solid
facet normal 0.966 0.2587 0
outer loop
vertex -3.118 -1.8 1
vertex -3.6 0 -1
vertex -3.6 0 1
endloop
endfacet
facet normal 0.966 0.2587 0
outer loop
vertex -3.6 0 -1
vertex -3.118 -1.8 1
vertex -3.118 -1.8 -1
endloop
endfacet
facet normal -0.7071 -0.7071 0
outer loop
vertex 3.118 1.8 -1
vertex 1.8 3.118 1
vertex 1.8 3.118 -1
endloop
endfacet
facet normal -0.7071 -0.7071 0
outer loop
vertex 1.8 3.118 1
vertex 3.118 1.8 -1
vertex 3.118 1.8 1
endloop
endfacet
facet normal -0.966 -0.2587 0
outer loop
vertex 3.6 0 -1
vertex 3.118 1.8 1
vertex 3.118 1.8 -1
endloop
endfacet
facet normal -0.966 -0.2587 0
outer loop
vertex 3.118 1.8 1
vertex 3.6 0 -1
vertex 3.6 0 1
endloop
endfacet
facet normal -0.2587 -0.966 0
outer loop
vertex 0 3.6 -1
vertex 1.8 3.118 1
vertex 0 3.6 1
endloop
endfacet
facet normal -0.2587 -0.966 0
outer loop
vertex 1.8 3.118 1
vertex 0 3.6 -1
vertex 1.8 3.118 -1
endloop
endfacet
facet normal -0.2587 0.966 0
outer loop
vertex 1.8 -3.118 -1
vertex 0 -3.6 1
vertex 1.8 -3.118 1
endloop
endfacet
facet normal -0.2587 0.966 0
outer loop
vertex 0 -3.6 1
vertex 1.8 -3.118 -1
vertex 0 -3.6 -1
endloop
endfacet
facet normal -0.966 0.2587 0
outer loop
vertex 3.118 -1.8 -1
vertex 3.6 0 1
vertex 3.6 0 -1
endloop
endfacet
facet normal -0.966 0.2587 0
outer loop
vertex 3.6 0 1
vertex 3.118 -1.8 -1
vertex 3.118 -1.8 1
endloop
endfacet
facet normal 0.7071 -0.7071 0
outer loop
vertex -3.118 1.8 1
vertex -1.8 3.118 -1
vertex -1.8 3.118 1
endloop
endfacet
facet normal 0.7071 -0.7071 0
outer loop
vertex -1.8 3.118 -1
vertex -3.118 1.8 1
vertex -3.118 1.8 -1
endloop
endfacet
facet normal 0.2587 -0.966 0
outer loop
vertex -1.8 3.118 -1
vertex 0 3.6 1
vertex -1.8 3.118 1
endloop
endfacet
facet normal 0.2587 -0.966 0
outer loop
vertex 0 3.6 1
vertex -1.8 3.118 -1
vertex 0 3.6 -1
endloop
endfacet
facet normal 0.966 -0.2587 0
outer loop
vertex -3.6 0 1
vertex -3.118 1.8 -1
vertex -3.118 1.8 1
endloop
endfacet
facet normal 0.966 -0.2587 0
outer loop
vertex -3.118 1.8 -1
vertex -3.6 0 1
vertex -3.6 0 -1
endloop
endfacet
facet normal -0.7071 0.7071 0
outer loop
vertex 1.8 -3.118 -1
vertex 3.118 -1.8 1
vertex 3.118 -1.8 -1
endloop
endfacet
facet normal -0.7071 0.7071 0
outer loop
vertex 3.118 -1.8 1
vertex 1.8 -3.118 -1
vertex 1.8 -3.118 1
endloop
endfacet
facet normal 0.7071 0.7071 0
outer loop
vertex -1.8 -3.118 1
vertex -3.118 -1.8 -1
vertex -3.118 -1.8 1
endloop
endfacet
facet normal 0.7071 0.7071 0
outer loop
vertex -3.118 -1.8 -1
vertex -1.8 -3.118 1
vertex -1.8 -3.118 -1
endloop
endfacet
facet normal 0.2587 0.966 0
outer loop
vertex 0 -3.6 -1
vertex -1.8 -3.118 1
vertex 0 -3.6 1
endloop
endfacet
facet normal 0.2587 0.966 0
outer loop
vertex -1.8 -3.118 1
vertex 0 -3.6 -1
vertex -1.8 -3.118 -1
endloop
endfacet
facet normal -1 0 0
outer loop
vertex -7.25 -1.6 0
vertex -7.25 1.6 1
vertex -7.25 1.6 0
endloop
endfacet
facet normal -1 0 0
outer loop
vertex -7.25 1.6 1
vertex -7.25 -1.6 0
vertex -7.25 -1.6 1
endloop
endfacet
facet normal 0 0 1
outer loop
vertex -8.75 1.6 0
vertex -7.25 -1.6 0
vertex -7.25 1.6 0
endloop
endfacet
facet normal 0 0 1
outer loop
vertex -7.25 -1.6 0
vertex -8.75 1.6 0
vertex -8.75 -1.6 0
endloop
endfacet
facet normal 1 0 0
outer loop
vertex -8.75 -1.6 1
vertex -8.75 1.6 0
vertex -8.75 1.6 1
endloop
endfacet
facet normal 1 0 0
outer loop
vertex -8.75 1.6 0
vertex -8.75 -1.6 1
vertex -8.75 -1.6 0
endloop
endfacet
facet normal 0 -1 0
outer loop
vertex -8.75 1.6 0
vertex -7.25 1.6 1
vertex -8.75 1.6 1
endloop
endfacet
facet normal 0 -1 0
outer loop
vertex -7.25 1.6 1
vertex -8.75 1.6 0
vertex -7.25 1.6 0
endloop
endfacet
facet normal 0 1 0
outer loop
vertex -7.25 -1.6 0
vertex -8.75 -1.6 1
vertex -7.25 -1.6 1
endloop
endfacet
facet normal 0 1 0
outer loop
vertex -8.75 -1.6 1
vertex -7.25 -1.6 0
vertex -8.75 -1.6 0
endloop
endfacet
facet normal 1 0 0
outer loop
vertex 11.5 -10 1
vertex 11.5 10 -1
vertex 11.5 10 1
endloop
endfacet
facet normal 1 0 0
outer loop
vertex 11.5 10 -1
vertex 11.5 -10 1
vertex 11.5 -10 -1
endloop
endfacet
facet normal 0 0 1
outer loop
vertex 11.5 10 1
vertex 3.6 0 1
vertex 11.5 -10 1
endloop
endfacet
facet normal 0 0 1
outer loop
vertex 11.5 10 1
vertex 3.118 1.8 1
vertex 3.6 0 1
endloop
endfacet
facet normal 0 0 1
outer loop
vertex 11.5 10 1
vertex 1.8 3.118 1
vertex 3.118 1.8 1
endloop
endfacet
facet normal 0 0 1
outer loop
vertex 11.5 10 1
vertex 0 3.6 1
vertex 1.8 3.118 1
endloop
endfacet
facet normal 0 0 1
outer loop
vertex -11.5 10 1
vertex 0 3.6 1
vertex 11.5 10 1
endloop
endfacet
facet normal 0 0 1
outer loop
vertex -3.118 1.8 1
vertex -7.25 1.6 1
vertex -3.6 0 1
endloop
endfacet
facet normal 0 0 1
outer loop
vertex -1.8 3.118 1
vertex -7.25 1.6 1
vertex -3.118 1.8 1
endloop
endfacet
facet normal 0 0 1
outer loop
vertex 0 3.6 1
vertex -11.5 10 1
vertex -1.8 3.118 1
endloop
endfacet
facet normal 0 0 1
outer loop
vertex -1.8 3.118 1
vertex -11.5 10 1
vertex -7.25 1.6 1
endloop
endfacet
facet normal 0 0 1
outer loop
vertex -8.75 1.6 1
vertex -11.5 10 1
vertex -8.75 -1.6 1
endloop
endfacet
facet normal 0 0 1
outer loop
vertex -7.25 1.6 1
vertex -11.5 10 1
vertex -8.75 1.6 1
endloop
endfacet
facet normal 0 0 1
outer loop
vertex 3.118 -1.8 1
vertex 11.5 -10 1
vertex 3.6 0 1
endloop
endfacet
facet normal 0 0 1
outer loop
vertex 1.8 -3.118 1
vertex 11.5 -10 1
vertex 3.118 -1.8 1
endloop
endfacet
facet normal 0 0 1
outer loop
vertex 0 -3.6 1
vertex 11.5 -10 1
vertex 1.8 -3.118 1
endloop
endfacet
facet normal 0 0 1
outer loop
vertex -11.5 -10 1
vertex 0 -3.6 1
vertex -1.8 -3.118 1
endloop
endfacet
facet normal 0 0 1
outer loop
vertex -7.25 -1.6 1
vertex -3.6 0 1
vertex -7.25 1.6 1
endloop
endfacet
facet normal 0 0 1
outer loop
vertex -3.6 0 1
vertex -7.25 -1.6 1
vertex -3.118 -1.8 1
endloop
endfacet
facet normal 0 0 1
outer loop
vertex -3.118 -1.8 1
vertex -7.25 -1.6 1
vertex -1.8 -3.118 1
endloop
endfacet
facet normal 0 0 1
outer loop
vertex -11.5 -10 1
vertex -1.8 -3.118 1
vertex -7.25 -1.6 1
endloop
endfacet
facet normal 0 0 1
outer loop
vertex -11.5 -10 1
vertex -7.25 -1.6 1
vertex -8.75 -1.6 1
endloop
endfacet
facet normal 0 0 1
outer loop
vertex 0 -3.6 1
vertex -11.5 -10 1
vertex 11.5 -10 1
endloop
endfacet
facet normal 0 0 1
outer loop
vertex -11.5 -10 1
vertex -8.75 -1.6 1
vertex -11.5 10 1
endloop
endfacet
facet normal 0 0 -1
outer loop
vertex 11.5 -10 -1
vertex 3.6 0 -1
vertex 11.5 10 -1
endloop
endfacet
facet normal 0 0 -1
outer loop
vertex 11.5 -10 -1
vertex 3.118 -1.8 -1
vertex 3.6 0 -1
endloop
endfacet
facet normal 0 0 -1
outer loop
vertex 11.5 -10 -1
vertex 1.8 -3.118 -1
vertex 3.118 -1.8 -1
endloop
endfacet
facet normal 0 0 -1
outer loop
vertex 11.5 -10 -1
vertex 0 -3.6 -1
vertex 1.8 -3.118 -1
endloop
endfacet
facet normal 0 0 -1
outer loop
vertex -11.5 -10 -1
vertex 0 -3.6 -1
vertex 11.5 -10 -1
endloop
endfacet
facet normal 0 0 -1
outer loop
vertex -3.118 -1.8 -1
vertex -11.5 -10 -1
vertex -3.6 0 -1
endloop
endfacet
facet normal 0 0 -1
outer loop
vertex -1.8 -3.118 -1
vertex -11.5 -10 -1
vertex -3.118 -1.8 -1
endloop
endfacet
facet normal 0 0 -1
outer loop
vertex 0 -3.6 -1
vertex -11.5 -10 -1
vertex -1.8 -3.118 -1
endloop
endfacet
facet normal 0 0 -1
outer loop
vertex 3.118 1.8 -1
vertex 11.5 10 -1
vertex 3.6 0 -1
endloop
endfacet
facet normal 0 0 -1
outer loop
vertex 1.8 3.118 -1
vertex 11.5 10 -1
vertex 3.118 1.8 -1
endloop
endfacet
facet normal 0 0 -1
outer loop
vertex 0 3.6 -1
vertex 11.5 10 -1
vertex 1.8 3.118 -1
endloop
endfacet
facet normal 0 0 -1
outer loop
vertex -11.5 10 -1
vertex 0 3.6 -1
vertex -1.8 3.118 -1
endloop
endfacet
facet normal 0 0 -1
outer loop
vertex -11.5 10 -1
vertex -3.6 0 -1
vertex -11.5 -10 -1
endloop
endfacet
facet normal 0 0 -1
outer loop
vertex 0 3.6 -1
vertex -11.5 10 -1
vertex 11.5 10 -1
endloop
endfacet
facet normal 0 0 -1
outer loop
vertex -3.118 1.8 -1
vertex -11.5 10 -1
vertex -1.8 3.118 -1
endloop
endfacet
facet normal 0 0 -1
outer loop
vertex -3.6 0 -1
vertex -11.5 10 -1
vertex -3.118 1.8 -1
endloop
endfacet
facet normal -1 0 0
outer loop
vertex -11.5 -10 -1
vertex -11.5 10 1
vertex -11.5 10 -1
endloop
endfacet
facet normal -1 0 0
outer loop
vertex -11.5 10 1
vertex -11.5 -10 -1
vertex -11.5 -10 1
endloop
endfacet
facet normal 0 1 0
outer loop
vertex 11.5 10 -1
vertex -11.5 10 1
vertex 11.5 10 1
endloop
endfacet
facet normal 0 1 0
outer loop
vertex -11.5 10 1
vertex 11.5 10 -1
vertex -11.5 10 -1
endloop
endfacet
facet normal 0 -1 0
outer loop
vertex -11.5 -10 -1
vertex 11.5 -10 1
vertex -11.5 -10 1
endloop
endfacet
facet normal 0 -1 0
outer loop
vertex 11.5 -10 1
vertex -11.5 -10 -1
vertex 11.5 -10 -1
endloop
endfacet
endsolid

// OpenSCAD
/*

cd /Users/d/Desktop/3dprint/ImplicitCad/
~/.cabal/bin/extopenscad pot2.scad

*/

$res=0.15;


module pot() {
	cylinder(r=3.6, h=5, center = true);
	translate([-8, 0, 0.75])
	cube(size = [1.5, 3.2, 1.5], center = true);
}

difference(){
	cube(size = [23, 20, 2], center = true, r=1);
	pot();
}
